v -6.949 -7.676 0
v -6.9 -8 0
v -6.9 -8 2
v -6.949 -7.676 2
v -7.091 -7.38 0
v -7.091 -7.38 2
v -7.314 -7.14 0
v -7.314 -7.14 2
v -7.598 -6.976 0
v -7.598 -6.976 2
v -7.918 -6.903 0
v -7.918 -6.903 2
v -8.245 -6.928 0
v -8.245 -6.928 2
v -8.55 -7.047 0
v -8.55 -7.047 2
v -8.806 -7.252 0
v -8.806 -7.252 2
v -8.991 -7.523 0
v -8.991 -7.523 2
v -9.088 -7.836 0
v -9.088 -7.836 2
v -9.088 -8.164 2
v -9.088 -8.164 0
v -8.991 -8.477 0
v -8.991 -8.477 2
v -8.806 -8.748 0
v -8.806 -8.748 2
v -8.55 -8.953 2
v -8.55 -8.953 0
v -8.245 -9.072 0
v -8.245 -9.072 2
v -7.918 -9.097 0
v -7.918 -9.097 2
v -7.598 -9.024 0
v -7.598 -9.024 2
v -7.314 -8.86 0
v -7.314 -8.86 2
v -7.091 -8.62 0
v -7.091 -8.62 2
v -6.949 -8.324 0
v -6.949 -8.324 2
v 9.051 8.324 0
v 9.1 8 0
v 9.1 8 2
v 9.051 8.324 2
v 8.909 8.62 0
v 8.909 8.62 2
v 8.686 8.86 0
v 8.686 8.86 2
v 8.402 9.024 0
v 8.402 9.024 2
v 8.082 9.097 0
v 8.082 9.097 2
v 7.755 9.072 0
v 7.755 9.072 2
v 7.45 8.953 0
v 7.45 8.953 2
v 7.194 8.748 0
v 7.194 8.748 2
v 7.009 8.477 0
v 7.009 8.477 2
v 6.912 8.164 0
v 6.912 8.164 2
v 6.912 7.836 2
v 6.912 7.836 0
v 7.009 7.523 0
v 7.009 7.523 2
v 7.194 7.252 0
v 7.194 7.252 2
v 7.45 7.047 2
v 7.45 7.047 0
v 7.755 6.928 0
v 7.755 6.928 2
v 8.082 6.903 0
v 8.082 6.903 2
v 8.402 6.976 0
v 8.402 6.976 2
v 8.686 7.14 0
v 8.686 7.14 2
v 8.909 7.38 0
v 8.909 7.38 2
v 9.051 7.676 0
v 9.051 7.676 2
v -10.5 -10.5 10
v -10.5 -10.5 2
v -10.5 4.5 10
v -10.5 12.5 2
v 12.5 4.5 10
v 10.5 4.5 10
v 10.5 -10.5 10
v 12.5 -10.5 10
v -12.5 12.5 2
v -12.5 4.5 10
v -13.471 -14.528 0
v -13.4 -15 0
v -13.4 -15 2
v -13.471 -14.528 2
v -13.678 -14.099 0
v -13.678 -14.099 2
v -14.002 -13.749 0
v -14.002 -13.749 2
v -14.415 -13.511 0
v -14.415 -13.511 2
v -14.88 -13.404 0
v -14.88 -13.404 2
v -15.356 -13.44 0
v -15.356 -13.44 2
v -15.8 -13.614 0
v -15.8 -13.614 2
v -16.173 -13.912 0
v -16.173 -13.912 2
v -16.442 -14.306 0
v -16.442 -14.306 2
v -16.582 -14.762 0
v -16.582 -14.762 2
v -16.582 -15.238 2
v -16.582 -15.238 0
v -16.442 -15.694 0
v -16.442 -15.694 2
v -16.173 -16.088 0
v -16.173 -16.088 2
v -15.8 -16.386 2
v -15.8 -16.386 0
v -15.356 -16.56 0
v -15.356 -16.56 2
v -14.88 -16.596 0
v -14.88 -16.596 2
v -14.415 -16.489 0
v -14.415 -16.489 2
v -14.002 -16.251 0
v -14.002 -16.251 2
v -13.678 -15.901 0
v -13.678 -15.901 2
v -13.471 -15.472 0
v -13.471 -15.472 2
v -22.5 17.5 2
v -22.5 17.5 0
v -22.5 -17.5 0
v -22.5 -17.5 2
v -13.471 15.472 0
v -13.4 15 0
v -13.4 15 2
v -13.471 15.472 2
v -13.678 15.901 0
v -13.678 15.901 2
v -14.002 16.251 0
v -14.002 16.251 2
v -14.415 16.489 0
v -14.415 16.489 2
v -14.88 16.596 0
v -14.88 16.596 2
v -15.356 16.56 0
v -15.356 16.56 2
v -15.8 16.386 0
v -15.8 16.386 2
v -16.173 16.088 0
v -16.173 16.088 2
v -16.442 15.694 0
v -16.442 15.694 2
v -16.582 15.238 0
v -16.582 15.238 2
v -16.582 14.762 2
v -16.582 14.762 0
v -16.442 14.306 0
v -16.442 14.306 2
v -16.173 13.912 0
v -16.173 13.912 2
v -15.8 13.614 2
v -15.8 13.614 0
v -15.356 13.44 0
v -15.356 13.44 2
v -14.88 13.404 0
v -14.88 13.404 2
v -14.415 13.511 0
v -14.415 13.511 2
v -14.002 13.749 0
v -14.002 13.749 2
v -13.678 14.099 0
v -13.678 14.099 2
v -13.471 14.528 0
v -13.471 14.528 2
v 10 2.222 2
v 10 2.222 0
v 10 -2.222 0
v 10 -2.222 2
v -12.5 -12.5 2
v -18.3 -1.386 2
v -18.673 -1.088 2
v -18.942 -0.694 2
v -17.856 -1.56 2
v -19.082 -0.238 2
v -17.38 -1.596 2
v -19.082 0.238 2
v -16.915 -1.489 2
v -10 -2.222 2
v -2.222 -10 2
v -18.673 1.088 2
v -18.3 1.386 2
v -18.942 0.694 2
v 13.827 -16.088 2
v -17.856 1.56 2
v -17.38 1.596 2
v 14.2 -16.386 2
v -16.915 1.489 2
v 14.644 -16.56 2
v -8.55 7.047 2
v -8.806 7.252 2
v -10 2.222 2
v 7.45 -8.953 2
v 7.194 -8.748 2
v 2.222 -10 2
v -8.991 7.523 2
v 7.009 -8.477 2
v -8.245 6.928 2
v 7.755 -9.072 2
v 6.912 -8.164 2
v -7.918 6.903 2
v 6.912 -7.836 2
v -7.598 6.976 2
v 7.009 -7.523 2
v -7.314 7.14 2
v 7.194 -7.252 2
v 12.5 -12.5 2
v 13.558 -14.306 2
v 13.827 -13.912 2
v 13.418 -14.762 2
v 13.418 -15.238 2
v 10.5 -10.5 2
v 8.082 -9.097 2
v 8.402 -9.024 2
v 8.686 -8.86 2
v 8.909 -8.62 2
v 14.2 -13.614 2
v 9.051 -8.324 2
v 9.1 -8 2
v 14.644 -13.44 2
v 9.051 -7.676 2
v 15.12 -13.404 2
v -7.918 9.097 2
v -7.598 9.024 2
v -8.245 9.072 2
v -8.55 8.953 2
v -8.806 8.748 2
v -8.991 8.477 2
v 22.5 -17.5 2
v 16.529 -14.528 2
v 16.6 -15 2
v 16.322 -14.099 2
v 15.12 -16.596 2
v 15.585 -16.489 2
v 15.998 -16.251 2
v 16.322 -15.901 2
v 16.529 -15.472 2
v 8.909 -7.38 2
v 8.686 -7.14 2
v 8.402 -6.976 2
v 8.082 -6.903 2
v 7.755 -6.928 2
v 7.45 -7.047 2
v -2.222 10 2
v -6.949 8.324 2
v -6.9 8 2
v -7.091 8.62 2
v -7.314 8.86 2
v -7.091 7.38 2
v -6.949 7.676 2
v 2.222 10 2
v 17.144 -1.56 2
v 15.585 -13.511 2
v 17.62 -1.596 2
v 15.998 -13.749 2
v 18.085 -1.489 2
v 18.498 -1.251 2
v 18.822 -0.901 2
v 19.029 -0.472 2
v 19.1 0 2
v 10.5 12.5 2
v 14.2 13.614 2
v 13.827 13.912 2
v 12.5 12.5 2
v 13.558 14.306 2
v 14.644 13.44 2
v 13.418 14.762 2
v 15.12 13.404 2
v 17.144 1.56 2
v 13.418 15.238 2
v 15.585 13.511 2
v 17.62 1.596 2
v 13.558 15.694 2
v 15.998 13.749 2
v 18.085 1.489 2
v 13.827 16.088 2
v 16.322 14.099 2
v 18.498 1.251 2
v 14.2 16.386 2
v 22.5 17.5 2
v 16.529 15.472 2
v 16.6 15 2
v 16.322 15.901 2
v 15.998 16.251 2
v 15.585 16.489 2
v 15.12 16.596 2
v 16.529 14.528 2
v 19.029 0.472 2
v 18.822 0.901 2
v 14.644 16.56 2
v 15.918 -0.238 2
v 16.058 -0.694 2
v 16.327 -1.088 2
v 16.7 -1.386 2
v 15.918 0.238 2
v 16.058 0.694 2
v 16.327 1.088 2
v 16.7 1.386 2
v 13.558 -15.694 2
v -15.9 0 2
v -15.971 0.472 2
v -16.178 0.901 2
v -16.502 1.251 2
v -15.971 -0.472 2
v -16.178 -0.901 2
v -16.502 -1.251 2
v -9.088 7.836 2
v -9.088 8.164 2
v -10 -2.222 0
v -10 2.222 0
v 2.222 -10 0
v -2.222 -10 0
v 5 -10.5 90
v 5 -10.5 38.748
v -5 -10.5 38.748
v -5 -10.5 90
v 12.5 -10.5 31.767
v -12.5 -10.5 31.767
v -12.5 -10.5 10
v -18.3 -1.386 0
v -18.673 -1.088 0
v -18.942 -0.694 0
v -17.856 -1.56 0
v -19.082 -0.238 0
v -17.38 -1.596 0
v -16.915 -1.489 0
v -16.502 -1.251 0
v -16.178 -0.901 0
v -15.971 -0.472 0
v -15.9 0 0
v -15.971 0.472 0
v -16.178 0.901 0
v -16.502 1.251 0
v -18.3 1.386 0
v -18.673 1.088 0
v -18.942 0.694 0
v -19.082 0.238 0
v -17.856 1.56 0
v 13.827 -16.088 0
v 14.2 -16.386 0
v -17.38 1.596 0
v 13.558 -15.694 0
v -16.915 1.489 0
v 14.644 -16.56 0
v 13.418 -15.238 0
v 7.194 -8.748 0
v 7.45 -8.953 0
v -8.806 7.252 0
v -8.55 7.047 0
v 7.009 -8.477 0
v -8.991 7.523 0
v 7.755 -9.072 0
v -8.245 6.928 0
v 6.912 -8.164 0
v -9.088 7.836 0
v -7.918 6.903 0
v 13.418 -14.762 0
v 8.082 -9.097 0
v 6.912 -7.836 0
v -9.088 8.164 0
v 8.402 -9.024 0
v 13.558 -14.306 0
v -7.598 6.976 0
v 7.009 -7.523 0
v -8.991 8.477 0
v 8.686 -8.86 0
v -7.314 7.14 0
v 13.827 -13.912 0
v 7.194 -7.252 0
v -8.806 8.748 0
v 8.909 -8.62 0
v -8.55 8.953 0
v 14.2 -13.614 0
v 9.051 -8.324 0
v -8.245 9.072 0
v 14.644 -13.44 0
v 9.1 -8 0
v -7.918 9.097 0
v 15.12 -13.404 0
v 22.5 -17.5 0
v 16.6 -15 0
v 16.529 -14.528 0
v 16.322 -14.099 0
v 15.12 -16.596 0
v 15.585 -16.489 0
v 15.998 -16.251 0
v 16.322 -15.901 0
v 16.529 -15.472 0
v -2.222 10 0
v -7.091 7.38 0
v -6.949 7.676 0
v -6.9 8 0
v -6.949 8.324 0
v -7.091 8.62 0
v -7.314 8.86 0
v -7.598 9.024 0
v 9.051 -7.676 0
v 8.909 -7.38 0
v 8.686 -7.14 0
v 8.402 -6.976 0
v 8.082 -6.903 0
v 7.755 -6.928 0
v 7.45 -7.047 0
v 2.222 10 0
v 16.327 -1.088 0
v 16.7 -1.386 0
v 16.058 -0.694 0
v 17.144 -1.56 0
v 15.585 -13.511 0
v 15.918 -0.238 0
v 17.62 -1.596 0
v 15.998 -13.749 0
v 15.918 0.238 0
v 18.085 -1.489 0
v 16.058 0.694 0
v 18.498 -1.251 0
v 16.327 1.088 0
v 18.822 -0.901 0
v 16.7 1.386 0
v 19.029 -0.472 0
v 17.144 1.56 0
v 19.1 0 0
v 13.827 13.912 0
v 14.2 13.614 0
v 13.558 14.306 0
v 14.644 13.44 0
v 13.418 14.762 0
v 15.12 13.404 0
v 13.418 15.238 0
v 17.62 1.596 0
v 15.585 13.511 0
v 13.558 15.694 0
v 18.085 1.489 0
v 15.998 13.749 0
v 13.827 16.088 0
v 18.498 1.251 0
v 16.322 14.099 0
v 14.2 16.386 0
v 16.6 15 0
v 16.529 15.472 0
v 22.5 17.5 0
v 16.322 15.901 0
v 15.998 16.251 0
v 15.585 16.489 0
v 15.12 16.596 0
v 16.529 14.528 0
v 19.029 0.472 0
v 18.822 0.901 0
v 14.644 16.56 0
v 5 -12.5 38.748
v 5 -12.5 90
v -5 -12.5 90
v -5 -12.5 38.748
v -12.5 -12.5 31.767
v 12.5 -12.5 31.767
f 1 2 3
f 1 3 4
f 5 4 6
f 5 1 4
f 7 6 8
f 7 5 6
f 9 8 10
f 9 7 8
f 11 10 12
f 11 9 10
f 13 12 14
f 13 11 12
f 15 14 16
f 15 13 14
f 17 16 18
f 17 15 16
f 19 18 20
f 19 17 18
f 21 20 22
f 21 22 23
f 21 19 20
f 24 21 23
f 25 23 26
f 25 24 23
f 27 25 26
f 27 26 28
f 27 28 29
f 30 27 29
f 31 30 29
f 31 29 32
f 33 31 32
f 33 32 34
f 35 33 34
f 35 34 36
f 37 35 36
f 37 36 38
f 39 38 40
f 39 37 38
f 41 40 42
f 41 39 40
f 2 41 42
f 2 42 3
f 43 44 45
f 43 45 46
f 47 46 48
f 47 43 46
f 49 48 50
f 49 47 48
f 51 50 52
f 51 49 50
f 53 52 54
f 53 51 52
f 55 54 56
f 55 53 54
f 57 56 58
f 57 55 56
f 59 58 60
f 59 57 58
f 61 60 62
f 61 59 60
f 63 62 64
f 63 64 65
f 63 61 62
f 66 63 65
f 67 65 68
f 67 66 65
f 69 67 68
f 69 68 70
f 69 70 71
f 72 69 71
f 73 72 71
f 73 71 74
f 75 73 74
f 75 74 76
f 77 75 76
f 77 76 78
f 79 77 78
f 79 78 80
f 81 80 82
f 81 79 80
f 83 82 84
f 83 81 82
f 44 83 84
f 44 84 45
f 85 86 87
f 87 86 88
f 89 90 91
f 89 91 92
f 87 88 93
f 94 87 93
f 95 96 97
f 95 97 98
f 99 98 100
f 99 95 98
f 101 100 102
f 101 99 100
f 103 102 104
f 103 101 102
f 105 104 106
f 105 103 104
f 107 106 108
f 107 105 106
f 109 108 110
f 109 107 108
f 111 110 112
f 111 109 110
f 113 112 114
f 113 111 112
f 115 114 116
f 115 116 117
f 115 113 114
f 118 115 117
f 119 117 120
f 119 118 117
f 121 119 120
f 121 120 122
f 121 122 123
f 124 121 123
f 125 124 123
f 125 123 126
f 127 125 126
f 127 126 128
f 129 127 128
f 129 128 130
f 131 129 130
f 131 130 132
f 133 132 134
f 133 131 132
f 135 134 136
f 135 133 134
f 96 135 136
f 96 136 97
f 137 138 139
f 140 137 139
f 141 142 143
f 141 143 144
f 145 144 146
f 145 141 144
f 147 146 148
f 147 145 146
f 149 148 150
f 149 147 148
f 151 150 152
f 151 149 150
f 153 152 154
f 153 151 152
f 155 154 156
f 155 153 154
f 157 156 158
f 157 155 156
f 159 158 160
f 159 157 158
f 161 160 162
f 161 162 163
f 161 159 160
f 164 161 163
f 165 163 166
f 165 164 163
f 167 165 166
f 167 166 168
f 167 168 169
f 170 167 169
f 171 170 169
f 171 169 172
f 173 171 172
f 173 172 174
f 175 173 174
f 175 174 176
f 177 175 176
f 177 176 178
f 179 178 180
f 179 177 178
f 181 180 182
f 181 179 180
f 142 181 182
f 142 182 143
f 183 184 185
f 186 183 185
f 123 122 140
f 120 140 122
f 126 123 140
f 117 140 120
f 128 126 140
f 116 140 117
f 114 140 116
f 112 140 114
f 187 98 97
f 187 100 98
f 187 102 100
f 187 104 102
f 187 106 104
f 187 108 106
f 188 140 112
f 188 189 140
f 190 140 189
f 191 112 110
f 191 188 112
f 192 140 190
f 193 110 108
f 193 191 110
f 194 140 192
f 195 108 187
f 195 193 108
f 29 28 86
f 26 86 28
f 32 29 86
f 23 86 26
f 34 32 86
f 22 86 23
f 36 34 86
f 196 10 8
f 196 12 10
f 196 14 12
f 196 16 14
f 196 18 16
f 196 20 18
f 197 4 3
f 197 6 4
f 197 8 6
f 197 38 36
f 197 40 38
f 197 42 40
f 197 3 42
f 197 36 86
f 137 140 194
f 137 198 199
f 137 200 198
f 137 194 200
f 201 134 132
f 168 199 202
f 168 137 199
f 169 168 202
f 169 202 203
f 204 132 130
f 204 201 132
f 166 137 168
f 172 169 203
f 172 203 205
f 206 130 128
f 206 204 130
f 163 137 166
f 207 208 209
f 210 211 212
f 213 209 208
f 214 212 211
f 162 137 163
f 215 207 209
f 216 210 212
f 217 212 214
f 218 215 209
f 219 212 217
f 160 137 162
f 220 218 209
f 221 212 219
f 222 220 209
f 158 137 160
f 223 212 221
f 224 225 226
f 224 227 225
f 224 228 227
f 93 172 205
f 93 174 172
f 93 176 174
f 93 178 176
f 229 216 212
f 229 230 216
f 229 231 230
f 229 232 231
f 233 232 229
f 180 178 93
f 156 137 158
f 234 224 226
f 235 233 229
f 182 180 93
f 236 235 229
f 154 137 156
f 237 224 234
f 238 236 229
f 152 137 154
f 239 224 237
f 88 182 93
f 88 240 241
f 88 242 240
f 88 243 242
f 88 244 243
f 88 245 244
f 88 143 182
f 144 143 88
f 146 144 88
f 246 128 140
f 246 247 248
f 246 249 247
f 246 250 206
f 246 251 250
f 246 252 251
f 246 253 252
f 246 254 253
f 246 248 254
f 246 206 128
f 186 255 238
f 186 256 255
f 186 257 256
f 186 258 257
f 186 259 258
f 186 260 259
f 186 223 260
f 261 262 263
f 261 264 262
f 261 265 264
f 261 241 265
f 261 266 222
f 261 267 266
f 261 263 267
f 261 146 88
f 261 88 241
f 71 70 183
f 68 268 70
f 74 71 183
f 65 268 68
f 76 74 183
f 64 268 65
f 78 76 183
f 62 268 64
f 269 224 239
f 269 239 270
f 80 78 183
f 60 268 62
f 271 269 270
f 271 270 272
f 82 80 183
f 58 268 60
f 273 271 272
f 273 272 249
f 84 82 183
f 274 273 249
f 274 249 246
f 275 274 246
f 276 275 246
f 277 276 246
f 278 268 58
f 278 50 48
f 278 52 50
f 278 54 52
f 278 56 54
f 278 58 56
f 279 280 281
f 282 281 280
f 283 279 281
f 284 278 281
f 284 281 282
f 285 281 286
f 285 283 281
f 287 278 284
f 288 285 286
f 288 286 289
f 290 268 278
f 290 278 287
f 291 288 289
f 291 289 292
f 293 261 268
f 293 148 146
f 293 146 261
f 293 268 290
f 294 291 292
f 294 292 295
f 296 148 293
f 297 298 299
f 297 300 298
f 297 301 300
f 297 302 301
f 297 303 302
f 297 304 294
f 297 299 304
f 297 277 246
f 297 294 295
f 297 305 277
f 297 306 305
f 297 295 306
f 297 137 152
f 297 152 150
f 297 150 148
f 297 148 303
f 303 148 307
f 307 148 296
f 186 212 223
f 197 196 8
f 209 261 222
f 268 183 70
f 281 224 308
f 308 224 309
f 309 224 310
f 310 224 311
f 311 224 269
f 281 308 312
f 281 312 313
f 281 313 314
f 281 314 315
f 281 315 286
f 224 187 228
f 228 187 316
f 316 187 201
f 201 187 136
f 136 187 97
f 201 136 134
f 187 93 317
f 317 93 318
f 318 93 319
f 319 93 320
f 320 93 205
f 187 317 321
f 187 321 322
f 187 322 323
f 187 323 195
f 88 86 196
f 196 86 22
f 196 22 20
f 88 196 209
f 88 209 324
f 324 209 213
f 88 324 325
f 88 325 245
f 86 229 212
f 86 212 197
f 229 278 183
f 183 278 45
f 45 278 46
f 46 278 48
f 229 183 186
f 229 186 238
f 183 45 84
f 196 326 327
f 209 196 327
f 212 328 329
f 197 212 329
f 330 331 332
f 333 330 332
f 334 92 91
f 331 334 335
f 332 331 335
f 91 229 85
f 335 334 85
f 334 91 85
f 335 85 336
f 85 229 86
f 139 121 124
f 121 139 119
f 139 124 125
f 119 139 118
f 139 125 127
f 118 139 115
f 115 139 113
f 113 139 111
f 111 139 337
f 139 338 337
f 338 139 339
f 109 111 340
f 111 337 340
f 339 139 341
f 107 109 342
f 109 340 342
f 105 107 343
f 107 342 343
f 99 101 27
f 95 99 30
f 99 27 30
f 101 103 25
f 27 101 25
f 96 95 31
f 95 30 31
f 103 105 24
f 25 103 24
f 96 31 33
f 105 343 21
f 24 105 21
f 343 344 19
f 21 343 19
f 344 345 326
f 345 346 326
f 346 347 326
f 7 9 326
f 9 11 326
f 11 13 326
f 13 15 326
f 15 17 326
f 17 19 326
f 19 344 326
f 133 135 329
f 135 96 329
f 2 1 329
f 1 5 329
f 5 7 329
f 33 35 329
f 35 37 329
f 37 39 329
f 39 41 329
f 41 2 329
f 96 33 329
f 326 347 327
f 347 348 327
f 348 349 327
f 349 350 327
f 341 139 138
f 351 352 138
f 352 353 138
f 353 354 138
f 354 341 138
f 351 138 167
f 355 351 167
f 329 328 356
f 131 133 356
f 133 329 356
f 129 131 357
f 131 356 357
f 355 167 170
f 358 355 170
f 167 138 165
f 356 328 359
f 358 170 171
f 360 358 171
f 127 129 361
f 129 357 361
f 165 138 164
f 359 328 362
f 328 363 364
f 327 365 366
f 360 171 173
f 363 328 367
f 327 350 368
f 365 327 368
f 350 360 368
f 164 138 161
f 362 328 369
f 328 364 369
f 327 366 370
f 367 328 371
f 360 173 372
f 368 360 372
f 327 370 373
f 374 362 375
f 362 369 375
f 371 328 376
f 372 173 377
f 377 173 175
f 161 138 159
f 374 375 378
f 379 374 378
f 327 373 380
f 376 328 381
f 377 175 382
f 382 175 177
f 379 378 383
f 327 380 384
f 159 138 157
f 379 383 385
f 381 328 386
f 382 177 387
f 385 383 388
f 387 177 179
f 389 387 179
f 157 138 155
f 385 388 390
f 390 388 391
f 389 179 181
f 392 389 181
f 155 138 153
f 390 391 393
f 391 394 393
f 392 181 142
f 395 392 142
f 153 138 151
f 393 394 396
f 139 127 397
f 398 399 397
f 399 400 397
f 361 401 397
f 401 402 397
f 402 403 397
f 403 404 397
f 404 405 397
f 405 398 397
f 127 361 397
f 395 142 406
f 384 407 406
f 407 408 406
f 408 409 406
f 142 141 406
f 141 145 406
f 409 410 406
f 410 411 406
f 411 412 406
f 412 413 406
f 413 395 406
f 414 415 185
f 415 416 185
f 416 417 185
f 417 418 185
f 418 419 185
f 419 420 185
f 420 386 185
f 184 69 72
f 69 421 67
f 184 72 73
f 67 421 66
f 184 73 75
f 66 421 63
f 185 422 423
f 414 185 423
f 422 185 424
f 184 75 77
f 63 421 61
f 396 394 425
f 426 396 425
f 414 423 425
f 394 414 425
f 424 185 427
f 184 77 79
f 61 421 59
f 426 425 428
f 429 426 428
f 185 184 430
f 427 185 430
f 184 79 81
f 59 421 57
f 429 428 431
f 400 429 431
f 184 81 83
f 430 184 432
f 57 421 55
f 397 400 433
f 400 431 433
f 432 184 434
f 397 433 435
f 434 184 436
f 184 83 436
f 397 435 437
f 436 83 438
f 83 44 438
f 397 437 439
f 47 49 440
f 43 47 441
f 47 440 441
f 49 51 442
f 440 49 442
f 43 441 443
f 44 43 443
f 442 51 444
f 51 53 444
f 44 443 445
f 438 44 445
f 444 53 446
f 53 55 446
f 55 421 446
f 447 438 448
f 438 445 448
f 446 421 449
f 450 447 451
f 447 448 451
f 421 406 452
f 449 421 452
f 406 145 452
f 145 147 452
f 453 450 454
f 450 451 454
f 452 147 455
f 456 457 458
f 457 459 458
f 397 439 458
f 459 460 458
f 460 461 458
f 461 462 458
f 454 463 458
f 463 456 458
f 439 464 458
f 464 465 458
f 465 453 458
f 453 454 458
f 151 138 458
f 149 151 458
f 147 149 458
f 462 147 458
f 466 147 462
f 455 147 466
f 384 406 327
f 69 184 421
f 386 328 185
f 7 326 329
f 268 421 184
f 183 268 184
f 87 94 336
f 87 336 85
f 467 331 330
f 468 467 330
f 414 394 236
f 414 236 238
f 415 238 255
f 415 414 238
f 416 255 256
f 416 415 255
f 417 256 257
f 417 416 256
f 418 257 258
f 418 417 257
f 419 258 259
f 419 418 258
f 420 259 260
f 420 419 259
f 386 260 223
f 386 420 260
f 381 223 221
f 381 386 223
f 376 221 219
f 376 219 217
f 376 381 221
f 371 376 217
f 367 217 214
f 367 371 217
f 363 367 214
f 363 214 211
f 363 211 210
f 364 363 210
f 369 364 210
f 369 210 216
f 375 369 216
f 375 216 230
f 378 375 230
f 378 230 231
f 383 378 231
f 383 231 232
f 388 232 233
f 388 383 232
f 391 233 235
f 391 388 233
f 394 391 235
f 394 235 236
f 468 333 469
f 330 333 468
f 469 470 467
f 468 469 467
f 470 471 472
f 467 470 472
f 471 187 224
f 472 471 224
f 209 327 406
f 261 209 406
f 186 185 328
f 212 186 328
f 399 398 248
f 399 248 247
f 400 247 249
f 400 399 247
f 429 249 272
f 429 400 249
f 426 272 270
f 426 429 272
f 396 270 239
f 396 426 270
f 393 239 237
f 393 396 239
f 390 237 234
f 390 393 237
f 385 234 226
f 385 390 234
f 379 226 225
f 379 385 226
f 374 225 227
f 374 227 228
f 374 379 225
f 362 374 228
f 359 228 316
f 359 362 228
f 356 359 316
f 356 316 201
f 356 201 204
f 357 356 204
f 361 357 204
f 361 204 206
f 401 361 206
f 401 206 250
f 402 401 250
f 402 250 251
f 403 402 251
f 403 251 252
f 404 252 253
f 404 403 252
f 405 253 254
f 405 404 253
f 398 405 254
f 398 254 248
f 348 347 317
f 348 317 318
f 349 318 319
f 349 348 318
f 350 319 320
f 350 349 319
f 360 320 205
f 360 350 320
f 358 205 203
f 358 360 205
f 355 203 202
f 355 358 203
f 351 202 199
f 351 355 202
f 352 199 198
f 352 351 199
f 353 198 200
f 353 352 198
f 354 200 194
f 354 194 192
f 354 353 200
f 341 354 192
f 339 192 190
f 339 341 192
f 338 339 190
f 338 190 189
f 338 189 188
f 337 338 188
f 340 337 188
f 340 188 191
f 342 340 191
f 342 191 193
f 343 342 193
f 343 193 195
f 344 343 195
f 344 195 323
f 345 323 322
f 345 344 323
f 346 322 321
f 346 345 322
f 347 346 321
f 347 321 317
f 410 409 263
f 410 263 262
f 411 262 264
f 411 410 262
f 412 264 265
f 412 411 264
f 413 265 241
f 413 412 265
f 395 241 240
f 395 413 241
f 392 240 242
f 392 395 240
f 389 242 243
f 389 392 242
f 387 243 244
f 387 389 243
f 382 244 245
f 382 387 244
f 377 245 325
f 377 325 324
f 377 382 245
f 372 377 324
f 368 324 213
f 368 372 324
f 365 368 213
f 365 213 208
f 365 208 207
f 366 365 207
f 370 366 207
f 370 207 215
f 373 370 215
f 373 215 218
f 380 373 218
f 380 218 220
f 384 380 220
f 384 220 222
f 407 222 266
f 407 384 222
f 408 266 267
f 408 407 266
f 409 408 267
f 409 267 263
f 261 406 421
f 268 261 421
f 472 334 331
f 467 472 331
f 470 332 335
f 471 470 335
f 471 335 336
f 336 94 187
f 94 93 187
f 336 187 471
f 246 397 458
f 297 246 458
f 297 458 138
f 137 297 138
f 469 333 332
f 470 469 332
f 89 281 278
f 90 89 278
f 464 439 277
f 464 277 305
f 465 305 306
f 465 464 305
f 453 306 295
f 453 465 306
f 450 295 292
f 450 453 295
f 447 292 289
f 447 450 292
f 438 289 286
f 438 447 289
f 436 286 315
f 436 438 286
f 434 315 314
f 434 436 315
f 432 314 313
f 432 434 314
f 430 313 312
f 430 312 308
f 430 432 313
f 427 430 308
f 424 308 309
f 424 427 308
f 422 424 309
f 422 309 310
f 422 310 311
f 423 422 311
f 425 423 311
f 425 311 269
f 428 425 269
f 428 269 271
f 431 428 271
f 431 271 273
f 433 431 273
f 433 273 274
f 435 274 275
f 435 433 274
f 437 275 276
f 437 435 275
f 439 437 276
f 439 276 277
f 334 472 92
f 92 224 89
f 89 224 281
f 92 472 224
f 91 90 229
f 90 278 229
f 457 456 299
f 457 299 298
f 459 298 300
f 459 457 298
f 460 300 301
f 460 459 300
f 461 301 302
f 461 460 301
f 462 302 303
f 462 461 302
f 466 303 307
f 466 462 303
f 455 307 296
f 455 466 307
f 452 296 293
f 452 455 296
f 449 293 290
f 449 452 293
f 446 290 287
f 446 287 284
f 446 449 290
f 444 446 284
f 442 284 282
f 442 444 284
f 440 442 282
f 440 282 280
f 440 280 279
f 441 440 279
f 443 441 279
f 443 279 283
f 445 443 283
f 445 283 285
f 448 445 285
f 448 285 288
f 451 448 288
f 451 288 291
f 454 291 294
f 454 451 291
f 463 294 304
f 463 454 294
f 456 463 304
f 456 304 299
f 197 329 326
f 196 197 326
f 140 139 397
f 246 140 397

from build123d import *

# Parameters (mm, degrees)
F1_W     = 21
F1_H     = 21
F1_R     = 1.1
F1_H_2   = 2
F1_W_2   = 10
F1_H_3   = 15
F1_R_2   = 1.6
F2_DEPTH = 2
F3_DEPTH = 90
F4_DEPTH = 10
F5_SIZE  = 7.99999
F7_DEPTH = 25


# Not quite as in the source:
# - a fillet or chamfer is up to 0.001 mm smaller than in the source, because OpenCascade refuses the exact size


with BuildPart() as f2:
    # F1 (on Top) → F2 (new body)
    with BuildSketch(Plane.XY):
        Rectangle(F1_W, F1_H)
        with Locations((-8, -8)):
            Circle(F1_R, mode=Mode.SUBTRACT)
        with Locations((8, -8)):
            Circle(F1_R, mode=Mode.SUBTRACT)
        with Locations((-8, 8)):
            Circle(F1_R, mode=Mode.SUBTRACT)
        Polygon((-10, 2.2218254069), (-2.2218254069, 10), (2.2218254069, 10), (10, 2.2218254069), (10, -2.2218254069), (2.2218254069, -10), (-2.2218254069, -10), (-10, -2.2218254069), align=None, mode=Mode.SUBTRACT)
        with Locations((8, 8)):
            Circle(F1_R, mode=Mode.SUBTRACT)
        Polygon((-10.5, 12.5), (-12.5, 12.5), (-12.5, 7.8503944539), (-12.5, -7.1496055461), (-12.5, -10.5), (-10.5, -10.5), (-10.5, 10.5), align=None)
        with Locations((0, 11.5)):
            Rectangle(F1_W, F1_H_2)
        Polygon((12.5, 12.5), (10.5, 12.5), (10.5, 10.5), (10.5, -10.5), (12.5, -10.5), (12.5, -7.1496055461), (12.5, 7.8503944539), align=None)
        with Locations((-17.5, 0.3503944539)):
            Rectangle(F1_W_2, F1_H_3)
        with Locations((-17.5, 0)):
            Circle(F1_R_2, mode=Mode.SUBTRACT)
        with Locations((17.5, 0.3503944539)):
            Rectangle(F1_W_2, F1_H_3)
        with Locations((17.5, 0)):
            Circle(F1_R_2, mode=Mode.SUBTRACT)
        Polygon((-12.5, 7.8503944539), (-12.5, 12.5), (-10.5, 12.5), (10.5, 12.5), (12.5, 12.5), (12.5, 7.8503944539), (22.5, 7.8503944539), (22.5, 17.5), (-22.5, 17.5), (-22.5, 7.8503944539), align=None)
        with Locations((-15, 15)):
            Circle(F1_R_2, mode=Mode.SUBTRACT)
        with Locations((15, 15)):
            Circle(F1_R_2, mode=Mode.SUBTRACT)
        Polygon((-12.5, -10.5), (-12.5, -7.1496055461), (-22.5, -7.1496055461), (-22.5, -17.5), (22.5, -17.5), (22.5, -7.1496055461), (12.5, -7.1496055461), (12.5, -10.5), (12.5, -12.5), (-12.5, -12.5), align=None)
        with Locations((-15, -15)):
            Circle(F1_R_2, mode=Mode.SUBTRACT)
        with Locations((15, -15)):
            Circle(F1_R_2, mode=Mode.SUBTRACT)
        Polygon((10.5, -10.5), (-10.5, -10.5), (-12.5, -10.5), (-12.5, -12.5), (12.5, -12.5), (12.5, -10.5), align=None)
    extrude(amount=F2_DEPTH)

    # F1 (on Top) → F3 (join)
    with BuildSketch(Plane.XY):
        Polygon((10.5, -10.5), (-10.5, -10.5), (-12.5, -10.5), (-12.5, -12.5), (12.5, -12.5), (12.5, -10.5), align=None)
    extrude(amount=F3_DEPTH)

    # F1 (on Top) → F4 (join)
    with BuildSketch(Plane.XY):
        Polygon((12.5, 12.5), (10.5, 12.5), (10.5, 10.5), (10.5, -10.5), (12.5, -10.5), (12.5, -7.1496055461), (12.5, 7.8503944539), align=None)
        Polygon((-10.5, 12.5), (-12.5, 12.5), (-12.5, 7.8503944539), (-12.5, -7.1496055461), (-12.5, -10.5), (-10.5, -10.5), (-10.5, 10.5), align=None)
        Polygon((10.5, -10.5), (-10.5, -10.5), (-12.5, -10.5), (-12.5, -12.5), (12.5, -12.5), (12.5, -10.5), align=None)
    extrude(amount=F4_DEPTH)

    # F5 (size 8 in the source; OpenCascade refuses exactly that, so slightly less here)
    f5_edges = [f2.edges().sort_by_distance(p)[0] for p in [
        (11.5, 12.5, 10),
        (-11.5, 12.5, 10),
    ]]
    chamfer(f5_edges, length=F5_SIZE)

    # F6 (on face) → F7 (cut)
    with BuildSketch(Plane(origin=(0, -10.5, 0), x_dir=(-1, 0, 0), z_dir=(0, 1, 0))):
        Polygon((-12.5, 90), (-12.5, 31.766526401), (-5, 38.7480794755), (-5, 90), align=None)
        Polygon((5, 38.7480794755), (12.5, 31.766526401), (12.5, 90), (5, 90), align=None)
    extrude(amount=-F7_DEPTH, mode=Mode.SUBTRACT)


solid = f2.part
